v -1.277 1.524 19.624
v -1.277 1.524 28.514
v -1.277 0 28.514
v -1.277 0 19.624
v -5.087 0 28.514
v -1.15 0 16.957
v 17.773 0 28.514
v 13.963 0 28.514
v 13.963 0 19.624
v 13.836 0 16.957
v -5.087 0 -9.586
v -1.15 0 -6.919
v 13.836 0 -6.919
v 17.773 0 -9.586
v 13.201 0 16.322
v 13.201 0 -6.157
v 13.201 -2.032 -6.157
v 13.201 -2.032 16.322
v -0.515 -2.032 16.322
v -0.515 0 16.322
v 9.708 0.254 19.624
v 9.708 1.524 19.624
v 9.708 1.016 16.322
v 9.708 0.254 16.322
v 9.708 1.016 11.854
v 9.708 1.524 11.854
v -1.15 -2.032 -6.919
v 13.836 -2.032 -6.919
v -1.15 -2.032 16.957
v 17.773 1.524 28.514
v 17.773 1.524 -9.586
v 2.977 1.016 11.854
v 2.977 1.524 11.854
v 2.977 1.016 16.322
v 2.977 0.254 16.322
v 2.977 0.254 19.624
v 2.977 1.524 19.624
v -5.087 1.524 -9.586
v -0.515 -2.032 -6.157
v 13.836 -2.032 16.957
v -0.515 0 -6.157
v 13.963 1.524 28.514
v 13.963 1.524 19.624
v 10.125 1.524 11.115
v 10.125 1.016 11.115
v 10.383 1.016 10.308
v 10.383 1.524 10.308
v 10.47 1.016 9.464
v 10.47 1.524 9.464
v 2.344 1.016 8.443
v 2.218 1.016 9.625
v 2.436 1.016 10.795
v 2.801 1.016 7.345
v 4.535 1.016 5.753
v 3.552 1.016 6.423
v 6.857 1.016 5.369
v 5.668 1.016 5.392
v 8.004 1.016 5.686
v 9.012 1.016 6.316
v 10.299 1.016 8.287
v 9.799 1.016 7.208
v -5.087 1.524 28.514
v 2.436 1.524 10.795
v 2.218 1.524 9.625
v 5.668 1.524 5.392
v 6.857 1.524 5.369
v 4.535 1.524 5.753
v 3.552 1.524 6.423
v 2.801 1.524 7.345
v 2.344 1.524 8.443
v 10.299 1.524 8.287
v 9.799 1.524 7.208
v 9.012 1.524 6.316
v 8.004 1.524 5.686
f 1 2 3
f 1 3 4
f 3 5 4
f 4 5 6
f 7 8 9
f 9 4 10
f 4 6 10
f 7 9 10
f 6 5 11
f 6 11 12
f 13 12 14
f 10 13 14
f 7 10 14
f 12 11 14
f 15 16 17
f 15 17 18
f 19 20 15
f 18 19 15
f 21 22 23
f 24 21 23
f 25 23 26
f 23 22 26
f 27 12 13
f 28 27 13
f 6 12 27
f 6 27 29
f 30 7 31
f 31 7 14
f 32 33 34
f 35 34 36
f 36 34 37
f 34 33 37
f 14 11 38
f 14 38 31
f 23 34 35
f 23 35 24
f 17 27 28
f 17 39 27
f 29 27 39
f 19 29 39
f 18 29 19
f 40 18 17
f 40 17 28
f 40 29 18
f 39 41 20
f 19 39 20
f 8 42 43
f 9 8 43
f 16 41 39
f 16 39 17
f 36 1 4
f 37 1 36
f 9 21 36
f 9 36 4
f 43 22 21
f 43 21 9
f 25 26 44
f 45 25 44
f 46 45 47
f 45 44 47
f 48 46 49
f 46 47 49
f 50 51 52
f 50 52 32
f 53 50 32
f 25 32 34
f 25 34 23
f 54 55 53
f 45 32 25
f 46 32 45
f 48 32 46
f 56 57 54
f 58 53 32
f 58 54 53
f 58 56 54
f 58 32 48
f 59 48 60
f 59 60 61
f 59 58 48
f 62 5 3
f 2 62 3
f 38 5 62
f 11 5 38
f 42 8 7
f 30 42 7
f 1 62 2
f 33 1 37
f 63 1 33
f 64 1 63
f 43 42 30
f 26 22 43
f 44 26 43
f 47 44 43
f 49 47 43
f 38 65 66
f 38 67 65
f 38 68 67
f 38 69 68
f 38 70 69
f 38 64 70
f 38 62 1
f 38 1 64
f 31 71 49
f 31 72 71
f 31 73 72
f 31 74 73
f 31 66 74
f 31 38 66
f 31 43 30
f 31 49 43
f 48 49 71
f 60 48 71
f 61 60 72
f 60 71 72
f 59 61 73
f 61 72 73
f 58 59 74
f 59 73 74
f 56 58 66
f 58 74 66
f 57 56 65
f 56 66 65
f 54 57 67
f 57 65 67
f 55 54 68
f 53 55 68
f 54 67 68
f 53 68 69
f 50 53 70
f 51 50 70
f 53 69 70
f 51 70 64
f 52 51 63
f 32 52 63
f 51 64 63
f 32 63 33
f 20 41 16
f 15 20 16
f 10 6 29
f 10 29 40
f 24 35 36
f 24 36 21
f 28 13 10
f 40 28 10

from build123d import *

# Parameters (mm, degrees)
SKETCH1_W           = 22.86
SKETCH1_H           = 38.1
BOSS_EXTRUDE1_DEPTH = 1.524
SKETCH2_W           = 14.986
SKETCH2_H           = 23.876
SKETCH2_W_2         = 13.716
SKETCH2_H_2         = 22.479
BOSS_EXTRUDE2_DEPTH = 2.032
CUT_EXTRUDE2_DEPTH  = 0.508
CUT_EXTRUDE3_START  = 0.508
SKETCH6_W           = 15.24
SKETCH6_H           = 8.89
CUT_EXTRUDE3_DEPTH  = 35.245345025
SKETCH7_W           = 6.731
SKETCH7_H           = 3.302
CUT_EXTRUDE4_DEPTH  = 0.762


with BuildPart() as part:
    # Sketch1 → Boss-Extrude1 (new body)
    with BuildSketch(Plane(origin=(0, 0, 0), x_dir=(1, 0, 0), z_dir=(0, 1, 0))):
        with Locations((6.342648046, -9.464051393)):
            Rectangle(SKETCH1_W, SKETCH1_H)
    extrude(amount=BOSS_EXTRUDE1_DEPTH)

    # Sketch2 → Boss-Extrude2 (add)
    with BuildSketch(Plane.XZ):
        with Locations((6.342648046, 5.019051393)):
            Rectangle(SKETCH2_W, SKETCH2_H)
        with Locations((6.342648046, 5.082551393)):
            Rectangle(SKETCH2_W_2, SKETCH2_H_2, mode=Mode.SUBTRACT)
    extrude(amount=BOSS_EXTRUDE2_DEPTH)

    # Sketch5 → Cut-Extrude2 (cut)
    with BuildSketch(Plane(origin=(0, 1.524, 0), x_dir=(1, 0, 0), z_dir=(0, 1, 0))):
        with BuildLine():
            ThreePointArc((10.470148046, -9.464051393), (5.088623524, -5.531662964), (2.977148046, -11.853542133))
            Line((2.977148046, -11.853542133), (9.708148046, -11.853542133))
            ThreePointArc((9.708148046, -11.853542133), (10.275036474, -10.718075914), (10.470148046, -9.464051393))
        make_face()
        with BuildLine():
            Line((9.708148046, -11.853542133), (2.977148046, -11.853542133))
            ThreePointArc((2.977148046, -11.853542133), (6.342648046, -13.591551393), (9.708148046, -11.853542133))
        make_face()
        with BuildLine():
            ThreePointArc((9.708148046, -11.853542133), (6.342648046, -13.591551393), (2.977148046, -11.853542133))
            Line((2.977148046, -11.853542133), (2.977148046, -28.514051393))
            Line((2.977148046, -28.514051393), (9.708148046, -28.514051393))
            Line((9.708148046, -28.514051393), (9.708148046, -11.853542133))
        make_face()
    extrude(amount=-CUT_EXTRUDE2_DEPTH, mode=Mode.SUBTRACT)

    # Sketch6 → Cut-Extrude3 (cut, through all)
    with BuildSketch(Plane(origin=(0, 1.016, 0), x_dir=(1, 0, 0), z_dir=(0, 1, 0)).offset(CUT_EXTRUDE3_START)):
        with Locations((6.342648046, -24.069051393)):
            Rectangle(SKETCH6_W, SKETCH6_H)
    extrude(amount=-CUT_EXTRUDE3_DEPTH, mode=Mode.SUBTRACT)

    # Sketch7 → Cut-Extrude4 (cut)
    with BuildSketch(Plane(origin=(0, 1.016, 0), x_dir=(1, 0, 0), z_dir=(0, 1, 0))):
        with Locations((6.342648046, -17.973051393)):
            Rectangle(SKETCH7_W, SKETCH7_H)
    extrude(amount=-CUT_EXTRUDE4_DEPTH, mode=Mode.SUBTRACT)


solid = part.part
